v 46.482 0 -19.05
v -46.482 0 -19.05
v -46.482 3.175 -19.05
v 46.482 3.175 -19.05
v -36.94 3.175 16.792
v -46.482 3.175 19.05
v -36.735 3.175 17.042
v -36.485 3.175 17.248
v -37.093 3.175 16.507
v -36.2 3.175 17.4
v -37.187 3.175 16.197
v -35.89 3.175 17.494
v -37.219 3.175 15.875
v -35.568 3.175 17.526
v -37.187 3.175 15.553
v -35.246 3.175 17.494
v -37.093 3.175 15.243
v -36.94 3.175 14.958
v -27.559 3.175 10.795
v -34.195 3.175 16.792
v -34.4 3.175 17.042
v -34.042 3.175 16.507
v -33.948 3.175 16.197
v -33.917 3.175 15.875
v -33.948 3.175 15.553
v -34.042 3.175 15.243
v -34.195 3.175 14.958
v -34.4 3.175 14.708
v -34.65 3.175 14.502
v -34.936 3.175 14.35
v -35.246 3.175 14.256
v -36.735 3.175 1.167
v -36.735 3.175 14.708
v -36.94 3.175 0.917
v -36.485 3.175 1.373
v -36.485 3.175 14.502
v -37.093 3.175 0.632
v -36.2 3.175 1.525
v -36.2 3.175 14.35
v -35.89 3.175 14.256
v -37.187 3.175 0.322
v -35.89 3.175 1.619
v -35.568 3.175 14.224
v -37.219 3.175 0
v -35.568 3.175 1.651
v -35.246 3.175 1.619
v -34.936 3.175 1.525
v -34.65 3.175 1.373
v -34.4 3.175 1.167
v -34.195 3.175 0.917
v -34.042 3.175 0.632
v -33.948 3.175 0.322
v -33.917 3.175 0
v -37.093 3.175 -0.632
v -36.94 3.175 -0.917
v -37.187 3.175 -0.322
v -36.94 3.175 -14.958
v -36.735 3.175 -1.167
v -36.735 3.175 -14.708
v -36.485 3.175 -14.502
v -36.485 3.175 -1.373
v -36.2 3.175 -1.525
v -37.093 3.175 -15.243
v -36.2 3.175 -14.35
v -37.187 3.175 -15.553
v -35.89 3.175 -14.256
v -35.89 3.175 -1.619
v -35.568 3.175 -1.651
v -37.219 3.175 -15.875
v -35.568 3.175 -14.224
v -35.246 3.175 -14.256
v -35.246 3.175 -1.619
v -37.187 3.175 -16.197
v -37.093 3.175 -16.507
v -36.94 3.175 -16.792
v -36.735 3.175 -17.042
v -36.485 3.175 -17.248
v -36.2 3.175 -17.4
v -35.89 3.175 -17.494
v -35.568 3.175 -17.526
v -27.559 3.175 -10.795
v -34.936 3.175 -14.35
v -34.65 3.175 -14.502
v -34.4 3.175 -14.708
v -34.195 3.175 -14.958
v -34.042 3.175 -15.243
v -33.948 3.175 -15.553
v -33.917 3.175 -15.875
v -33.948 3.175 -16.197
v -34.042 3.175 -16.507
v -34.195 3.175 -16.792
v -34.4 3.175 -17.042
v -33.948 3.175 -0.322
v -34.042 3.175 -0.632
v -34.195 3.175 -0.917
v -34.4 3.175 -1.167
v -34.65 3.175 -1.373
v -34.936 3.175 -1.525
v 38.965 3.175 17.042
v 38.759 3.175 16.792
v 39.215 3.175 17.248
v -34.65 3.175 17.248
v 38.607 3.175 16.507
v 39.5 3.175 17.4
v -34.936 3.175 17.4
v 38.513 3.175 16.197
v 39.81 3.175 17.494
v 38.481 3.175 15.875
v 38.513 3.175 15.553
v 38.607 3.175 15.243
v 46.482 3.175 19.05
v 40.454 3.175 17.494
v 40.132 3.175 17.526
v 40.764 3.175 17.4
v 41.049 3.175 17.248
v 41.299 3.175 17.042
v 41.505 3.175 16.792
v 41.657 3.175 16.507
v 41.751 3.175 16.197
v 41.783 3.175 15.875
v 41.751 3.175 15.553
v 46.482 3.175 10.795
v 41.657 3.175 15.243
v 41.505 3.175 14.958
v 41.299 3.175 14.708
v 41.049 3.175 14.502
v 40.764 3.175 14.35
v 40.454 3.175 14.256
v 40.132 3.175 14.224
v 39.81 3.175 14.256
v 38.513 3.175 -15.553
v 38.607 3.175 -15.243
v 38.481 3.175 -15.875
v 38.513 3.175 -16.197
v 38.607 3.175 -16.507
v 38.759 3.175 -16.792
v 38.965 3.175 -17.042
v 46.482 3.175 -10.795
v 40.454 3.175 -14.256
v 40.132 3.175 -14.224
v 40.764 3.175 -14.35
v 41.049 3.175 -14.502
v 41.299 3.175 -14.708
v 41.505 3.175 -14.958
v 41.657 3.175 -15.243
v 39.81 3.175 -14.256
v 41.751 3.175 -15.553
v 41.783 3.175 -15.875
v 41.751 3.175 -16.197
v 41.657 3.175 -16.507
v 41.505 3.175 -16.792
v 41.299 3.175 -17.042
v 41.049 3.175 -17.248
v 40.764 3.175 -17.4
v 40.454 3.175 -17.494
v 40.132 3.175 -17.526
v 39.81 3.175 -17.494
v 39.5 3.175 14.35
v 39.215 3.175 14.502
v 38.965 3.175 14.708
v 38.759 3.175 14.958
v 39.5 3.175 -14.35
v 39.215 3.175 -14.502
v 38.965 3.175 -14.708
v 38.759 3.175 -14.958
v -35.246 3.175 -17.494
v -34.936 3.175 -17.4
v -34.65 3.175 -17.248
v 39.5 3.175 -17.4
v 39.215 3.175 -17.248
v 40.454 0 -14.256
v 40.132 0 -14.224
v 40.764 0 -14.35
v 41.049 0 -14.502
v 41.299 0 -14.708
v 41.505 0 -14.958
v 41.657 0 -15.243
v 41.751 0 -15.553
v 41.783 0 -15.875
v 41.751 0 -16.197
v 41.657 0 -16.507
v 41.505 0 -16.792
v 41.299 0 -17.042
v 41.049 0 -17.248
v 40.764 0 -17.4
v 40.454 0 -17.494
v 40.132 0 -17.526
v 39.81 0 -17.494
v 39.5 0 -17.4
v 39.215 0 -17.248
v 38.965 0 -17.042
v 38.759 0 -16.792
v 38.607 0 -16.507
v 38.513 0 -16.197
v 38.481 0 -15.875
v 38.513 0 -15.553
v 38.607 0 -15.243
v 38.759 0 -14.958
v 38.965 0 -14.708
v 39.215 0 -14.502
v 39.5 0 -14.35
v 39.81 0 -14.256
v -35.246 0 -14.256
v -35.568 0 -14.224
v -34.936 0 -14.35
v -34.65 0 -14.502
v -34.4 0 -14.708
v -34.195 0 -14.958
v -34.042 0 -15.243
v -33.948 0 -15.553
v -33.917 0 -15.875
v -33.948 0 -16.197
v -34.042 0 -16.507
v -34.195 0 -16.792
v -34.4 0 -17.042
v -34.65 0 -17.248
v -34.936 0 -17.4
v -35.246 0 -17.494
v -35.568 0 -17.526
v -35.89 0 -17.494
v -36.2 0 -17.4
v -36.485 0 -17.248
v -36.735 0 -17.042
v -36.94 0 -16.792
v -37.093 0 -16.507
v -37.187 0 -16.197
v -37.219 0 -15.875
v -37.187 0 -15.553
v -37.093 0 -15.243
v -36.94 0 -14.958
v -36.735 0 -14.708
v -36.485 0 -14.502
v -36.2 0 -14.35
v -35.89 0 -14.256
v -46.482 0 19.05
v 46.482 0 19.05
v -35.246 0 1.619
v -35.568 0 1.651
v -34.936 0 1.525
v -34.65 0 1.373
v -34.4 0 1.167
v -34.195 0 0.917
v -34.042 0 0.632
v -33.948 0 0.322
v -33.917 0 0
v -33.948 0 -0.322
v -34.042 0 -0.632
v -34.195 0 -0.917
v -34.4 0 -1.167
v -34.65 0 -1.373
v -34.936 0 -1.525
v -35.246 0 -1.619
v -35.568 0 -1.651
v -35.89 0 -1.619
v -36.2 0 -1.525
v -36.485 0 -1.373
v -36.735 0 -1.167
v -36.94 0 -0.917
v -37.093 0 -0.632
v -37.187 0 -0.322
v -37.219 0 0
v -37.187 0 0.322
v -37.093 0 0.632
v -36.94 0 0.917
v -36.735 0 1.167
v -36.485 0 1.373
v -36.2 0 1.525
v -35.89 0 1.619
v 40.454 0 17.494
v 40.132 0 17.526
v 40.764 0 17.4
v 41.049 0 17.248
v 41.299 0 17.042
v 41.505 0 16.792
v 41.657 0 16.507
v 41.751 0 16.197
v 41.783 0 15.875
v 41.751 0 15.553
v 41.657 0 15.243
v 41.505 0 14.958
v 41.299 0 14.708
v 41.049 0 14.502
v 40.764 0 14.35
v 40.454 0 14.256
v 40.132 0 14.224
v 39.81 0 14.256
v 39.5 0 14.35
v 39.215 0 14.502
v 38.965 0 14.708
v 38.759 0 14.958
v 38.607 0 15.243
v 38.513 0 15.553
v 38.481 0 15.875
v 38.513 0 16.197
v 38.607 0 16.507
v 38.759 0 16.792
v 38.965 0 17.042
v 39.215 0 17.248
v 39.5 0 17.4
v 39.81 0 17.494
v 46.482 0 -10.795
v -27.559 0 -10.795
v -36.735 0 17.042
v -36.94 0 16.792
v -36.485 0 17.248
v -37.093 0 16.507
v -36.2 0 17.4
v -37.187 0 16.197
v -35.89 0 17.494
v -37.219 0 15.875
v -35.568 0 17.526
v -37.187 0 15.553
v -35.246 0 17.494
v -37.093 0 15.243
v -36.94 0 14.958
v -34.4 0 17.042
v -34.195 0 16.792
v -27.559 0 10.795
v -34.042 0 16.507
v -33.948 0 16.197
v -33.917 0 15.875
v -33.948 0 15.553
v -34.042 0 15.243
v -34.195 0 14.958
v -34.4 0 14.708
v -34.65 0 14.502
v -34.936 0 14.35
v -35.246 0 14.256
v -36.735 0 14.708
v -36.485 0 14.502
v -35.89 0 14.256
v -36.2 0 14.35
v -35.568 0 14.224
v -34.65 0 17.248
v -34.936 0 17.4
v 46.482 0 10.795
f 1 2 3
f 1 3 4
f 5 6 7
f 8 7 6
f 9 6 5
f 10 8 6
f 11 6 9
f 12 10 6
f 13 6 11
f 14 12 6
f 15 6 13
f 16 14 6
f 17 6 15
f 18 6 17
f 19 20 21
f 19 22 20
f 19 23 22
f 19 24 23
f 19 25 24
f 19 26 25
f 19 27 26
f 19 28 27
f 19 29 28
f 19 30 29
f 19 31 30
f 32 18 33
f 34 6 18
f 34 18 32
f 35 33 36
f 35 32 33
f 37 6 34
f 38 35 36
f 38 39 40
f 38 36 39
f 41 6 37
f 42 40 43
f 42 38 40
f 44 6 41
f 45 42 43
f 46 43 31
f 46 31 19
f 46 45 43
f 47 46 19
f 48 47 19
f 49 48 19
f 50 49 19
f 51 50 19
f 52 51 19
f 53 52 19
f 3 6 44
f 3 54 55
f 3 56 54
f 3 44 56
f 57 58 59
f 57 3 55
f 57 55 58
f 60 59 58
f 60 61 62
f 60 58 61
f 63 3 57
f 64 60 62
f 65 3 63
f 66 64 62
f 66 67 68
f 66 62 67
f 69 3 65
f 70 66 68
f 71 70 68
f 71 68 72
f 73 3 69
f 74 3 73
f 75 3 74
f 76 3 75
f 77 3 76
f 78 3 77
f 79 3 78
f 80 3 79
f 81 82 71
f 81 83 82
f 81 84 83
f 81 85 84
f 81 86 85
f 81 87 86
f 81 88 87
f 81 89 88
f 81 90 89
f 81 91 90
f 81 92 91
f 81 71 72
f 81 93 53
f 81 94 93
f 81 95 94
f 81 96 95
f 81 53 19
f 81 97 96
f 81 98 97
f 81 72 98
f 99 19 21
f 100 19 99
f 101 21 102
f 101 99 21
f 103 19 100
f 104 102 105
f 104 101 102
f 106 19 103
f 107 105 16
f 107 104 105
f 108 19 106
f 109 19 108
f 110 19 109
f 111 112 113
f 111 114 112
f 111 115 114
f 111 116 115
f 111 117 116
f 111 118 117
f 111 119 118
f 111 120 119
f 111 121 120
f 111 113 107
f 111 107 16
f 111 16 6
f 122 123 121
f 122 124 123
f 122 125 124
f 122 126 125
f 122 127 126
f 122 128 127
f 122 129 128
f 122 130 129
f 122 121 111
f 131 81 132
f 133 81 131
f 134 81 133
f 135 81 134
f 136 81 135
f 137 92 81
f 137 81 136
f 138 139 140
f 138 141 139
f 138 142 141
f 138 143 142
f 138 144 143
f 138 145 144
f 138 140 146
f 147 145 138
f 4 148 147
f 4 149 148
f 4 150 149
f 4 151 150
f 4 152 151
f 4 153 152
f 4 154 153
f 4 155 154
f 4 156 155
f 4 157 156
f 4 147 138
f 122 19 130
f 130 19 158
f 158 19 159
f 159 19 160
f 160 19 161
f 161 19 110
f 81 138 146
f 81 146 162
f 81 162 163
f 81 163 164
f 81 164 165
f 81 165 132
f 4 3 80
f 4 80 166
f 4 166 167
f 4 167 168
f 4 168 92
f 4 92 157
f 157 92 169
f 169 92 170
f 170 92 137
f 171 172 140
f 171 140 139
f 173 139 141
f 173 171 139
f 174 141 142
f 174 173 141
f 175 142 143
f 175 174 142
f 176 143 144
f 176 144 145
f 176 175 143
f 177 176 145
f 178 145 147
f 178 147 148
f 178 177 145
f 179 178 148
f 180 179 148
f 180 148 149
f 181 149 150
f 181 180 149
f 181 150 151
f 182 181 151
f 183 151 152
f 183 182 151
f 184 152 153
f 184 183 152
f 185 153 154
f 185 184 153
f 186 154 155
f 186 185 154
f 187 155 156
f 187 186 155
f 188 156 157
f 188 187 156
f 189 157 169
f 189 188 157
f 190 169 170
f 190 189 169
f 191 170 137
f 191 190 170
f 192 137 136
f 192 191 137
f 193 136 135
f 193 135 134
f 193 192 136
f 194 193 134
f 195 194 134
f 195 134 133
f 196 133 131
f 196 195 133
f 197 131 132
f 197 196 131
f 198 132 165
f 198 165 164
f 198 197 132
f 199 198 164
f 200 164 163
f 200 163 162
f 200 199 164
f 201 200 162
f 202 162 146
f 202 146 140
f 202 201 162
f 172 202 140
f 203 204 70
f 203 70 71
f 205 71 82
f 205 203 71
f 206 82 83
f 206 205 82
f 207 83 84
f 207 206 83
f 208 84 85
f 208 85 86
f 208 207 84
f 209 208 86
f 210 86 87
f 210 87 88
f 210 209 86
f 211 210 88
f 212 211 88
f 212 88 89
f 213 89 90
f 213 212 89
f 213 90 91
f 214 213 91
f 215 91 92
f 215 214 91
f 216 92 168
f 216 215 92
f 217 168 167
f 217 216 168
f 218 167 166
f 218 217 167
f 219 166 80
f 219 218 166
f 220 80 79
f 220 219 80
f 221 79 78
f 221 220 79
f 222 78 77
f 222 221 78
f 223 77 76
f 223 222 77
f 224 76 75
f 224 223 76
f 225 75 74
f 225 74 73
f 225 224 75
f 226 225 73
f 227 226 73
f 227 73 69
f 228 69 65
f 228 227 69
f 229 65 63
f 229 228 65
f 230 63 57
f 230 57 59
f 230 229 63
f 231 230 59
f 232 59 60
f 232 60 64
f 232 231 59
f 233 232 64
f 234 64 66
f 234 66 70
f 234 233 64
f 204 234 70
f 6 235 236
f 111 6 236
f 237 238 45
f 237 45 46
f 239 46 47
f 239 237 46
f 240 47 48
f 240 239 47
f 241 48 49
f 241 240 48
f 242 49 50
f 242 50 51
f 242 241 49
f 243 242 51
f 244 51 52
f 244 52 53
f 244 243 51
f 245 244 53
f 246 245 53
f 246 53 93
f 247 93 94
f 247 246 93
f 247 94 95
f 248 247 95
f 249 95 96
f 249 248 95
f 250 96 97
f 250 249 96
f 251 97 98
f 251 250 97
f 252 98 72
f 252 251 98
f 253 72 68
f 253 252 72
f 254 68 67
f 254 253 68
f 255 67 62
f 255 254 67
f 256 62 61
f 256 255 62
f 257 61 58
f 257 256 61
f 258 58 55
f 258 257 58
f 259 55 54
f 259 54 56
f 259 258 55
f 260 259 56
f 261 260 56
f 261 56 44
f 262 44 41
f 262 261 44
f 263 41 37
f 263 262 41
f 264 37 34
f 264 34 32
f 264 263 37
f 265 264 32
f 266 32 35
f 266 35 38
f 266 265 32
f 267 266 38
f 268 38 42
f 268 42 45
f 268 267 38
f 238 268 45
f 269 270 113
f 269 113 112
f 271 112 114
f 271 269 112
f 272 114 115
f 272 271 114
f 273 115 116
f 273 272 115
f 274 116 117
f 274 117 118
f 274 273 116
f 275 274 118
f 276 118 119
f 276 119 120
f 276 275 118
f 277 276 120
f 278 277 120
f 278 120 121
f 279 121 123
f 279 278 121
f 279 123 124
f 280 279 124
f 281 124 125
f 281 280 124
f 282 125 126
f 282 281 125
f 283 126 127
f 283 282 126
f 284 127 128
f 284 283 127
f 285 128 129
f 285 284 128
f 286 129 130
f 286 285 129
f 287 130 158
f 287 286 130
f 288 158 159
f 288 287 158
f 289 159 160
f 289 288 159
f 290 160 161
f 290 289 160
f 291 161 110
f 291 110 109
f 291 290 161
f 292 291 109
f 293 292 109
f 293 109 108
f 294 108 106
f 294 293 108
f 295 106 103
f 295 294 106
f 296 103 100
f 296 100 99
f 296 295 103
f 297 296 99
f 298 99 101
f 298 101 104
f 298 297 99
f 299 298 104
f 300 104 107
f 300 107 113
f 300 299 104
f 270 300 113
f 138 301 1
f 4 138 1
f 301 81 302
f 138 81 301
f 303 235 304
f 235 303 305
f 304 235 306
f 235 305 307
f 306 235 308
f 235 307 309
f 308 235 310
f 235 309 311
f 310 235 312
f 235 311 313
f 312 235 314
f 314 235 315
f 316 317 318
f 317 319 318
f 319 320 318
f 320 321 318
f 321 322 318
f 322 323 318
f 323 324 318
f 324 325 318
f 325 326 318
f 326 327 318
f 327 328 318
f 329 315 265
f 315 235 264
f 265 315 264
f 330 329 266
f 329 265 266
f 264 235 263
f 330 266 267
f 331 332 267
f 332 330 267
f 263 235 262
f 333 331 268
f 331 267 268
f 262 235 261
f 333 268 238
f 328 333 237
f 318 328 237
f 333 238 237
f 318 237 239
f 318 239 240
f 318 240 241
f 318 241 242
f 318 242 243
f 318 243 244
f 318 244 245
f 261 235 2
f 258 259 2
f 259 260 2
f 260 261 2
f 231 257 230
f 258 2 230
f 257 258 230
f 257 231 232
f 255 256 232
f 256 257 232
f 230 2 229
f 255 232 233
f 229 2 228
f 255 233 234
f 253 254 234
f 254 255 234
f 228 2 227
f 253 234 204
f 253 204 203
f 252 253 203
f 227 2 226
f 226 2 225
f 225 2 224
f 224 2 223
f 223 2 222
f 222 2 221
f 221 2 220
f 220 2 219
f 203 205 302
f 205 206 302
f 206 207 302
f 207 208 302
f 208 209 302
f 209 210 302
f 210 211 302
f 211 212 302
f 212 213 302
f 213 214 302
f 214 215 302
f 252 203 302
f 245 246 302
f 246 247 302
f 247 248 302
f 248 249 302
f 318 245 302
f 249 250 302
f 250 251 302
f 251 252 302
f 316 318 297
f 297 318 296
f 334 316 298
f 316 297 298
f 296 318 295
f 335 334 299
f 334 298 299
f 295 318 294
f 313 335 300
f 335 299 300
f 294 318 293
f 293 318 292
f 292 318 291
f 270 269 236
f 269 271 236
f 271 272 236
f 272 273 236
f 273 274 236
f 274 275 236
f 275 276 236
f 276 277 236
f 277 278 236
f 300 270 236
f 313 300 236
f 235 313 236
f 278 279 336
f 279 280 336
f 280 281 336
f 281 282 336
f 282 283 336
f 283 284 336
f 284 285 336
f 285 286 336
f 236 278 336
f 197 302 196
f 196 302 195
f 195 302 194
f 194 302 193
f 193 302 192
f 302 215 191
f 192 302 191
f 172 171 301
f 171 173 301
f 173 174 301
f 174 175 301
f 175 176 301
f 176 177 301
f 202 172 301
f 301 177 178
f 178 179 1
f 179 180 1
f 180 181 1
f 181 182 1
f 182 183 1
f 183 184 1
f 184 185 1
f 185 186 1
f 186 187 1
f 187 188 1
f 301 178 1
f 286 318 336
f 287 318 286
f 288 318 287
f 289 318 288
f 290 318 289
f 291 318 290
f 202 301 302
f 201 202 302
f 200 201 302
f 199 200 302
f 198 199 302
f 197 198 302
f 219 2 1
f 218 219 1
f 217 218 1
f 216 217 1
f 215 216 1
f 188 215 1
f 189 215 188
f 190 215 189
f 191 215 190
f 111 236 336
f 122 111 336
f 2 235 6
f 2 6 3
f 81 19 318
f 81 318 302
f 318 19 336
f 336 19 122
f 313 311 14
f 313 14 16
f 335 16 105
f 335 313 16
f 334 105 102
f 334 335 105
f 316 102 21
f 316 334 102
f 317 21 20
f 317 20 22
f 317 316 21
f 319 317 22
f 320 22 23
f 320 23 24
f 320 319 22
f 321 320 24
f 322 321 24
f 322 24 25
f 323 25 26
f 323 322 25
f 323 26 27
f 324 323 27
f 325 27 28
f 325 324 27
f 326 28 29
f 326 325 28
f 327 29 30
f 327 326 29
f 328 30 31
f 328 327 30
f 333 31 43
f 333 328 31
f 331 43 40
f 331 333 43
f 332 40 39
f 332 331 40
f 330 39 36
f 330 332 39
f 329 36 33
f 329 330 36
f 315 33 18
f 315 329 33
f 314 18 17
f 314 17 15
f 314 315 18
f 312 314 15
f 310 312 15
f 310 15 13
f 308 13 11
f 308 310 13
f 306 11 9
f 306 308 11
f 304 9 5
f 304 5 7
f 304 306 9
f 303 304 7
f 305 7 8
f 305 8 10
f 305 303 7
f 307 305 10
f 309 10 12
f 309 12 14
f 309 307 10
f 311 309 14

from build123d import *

# Parameters (mm, degrees)
SKETCH1_W           = 92.964
SKETCH1_H           = 38.1
SKETCH1_R           = 1.651
BOSS_EXTRUDE1_DEPTH = 3.175
SKETCH2_W           = 74.041
SKETCH2_H           = 21.59
CUT_EXTRUDE1_DEPTH  = 3.175


with BuildPart() as part:
    # Sketch1 → Boss-Extrude1 (new body)
    with BuildSketch(Plane(origin=(0, 0, 0), x_dir=(1, 0, 0), z_dir=(0, 1, 0))):
        Rectangle(SKETCH1_W, SKETCH1_H)
        with Locations(Location((-35.567692741, -15.875, 0), (0, 0, 270))):
            Circle(SKETCH1_R, mode=Mode.SUBTRACT)
        with Locations(Location((-35.567692741, 15.875, 0), (0, 0, 270))):
            Circle(SKETCH1_R, mode=Mode.SUBTRACT)
        with Locations(Location((40.132, 15.875, 0), (0, 0, 270))):
            Circle(SKETCH1_R, mode=Mode.SUBTRACT)
        with Locations(Location((40.132, -15.875, 0), (0, 0, 270))):
            Circle(SKETCH1_R, mode=Mode.SUBTRACT)
        with Locations(Location((-35.567692741, 0, 0), (0, 0, 270))):
            Circle(SKETCH1_R, mode=Mode.SUBTRACT)
    extrude(amount=BOSS_EXTRUDE1_DEPTH)

    # Sketch2 → Cut-Extrude1 (cut)
    with BuildSketch(Plane(origin=(0, 3.175, 0), x_dir=(1, 0, 0), z_dir=(0, 1, 0))):
        with Locations((9.4615, 0)):
            Rectangle(SKETCH2_W, SKETCH2_H)
    extrude(amount=-CUT_EXTRUDE1_DEPTH, mode=Mode.SUBTRACT)


solid = part.part
